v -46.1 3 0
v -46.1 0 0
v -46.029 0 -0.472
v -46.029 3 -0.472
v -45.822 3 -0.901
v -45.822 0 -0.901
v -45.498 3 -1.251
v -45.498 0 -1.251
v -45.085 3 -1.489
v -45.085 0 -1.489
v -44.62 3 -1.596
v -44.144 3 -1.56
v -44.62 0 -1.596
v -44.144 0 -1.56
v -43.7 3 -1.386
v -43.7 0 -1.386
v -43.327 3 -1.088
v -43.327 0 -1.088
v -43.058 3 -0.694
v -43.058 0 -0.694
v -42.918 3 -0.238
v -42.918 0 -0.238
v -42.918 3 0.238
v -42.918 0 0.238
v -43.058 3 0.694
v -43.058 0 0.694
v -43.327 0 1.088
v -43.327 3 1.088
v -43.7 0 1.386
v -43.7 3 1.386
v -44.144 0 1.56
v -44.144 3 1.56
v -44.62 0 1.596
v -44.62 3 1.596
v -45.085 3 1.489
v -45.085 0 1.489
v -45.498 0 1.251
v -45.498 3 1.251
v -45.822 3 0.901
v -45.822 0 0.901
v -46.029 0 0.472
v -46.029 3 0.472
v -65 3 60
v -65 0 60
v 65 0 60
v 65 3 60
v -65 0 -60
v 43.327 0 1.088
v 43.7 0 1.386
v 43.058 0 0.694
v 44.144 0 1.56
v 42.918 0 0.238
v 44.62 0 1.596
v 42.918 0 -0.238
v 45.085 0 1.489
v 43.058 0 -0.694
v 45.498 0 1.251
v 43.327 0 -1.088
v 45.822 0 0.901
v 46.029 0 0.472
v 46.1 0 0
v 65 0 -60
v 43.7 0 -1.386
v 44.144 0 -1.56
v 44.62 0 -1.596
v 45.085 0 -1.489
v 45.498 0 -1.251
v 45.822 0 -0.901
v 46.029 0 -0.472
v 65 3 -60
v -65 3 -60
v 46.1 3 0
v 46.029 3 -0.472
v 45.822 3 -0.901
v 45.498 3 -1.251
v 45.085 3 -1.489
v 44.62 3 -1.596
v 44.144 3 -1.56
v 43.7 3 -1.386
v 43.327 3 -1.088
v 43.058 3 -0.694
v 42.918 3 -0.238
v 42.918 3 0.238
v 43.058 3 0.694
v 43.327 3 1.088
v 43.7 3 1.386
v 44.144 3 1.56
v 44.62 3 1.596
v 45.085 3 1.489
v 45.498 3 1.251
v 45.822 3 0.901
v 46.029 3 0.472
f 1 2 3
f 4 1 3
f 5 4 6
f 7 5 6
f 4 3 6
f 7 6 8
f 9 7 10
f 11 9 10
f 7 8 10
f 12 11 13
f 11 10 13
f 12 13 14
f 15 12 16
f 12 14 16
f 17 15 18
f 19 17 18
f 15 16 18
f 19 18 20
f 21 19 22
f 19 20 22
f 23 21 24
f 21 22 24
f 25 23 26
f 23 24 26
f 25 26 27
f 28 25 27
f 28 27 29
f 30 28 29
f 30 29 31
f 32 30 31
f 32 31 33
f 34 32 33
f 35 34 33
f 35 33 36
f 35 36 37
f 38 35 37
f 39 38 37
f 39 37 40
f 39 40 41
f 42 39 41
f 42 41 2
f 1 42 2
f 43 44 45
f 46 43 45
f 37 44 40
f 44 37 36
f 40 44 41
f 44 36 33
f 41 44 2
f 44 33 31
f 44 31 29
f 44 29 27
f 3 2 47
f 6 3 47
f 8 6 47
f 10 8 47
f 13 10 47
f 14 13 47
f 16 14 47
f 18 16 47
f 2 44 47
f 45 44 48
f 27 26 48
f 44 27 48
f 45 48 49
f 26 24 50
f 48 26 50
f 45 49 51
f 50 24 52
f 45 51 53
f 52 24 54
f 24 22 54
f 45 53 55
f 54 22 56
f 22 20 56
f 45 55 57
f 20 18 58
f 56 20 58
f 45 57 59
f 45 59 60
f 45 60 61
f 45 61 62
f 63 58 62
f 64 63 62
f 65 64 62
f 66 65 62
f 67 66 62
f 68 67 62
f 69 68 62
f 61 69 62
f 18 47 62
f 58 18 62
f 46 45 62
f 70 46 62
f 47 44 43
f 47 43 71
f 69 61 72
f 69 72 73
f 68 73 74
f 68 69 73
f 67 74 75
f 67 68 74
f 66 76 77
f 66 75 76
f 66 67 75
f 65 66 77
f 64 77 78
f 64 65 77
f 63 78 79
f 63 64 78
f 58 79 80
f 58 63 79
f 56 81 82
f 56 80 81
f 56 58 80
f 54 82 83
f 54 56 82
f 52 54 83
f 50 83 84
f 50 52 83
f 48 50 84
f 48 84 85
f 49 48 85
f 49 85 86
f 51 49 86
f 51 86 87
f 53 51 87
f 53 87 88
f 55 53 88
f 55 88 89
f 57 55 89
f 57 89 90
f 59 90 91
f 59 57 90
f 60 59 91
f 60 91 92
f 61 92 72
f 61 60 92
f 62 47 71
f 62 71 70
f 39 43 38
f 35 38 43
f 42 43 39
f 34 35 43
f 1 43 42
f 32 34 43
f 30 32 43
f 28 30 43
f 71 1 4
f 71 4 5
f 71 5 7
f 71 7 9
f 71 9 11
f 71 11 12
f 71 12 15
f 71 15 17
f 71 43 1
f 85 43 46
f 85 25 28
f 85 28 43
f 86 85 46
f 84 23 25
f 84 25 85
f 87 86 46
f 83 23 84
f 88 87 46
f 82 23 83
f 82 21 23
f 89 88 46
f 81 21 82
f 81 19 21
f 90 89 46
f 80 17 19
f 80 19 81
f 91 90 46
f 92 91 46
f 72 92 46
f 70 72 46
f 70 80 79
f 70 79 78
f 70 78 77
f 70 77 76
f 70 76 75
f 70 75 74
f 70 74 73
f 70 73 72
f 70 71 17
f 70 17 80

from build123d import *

# Parameters (mm, degrees)
SKETCH1_W           = 130
SKETCH1_H           = 120
BOSS_EXTRUDE1_DEPTH = 3
CUT_EXTRUDE1_START  = -4
SKETCH2_R           = 1.6
CUT_EXTRUDE1_DEPTH  = 5


with BuildPart() as part:
    # Sketch1 → Boss-Extrude1 (new body)
    with BuildSketch(Plane(origin=(0, 0, 0), x_dir=(1, 0, 0), z_dir=(0, 1, 0))):
        Rectangle(SKETCH1_W, SKETCH1_H)
    extrude(amount=BOSS_EXTRUDE1_DEPTH)

    # Sketch2 → Cut-Extrude1 (cut)
    with BuildSketch(Plane(origin=(0, 3, 0), x_dir=(1, 0, 0), z_dir=(0, 1, 0)).offset(CUT_EXTRUDE1_START)):
        with Locations((44.5, 0)):
            Circle(SKETCH2_R)
    cut_extrude1 = extrude(amount=CUT_EXTRUDE1_DEPTH, mode=Mode.SUBTRACT)

    # Mirror1: Cut-Extrude1 across plane
    add(cut_extrude1.mirror(Plane(origin=(0, 0, 0), x_dir=(0, 0, 1), z_dir=(1, 0, 0))), mode=Mode.SUBTRACT)


solid = part.part
